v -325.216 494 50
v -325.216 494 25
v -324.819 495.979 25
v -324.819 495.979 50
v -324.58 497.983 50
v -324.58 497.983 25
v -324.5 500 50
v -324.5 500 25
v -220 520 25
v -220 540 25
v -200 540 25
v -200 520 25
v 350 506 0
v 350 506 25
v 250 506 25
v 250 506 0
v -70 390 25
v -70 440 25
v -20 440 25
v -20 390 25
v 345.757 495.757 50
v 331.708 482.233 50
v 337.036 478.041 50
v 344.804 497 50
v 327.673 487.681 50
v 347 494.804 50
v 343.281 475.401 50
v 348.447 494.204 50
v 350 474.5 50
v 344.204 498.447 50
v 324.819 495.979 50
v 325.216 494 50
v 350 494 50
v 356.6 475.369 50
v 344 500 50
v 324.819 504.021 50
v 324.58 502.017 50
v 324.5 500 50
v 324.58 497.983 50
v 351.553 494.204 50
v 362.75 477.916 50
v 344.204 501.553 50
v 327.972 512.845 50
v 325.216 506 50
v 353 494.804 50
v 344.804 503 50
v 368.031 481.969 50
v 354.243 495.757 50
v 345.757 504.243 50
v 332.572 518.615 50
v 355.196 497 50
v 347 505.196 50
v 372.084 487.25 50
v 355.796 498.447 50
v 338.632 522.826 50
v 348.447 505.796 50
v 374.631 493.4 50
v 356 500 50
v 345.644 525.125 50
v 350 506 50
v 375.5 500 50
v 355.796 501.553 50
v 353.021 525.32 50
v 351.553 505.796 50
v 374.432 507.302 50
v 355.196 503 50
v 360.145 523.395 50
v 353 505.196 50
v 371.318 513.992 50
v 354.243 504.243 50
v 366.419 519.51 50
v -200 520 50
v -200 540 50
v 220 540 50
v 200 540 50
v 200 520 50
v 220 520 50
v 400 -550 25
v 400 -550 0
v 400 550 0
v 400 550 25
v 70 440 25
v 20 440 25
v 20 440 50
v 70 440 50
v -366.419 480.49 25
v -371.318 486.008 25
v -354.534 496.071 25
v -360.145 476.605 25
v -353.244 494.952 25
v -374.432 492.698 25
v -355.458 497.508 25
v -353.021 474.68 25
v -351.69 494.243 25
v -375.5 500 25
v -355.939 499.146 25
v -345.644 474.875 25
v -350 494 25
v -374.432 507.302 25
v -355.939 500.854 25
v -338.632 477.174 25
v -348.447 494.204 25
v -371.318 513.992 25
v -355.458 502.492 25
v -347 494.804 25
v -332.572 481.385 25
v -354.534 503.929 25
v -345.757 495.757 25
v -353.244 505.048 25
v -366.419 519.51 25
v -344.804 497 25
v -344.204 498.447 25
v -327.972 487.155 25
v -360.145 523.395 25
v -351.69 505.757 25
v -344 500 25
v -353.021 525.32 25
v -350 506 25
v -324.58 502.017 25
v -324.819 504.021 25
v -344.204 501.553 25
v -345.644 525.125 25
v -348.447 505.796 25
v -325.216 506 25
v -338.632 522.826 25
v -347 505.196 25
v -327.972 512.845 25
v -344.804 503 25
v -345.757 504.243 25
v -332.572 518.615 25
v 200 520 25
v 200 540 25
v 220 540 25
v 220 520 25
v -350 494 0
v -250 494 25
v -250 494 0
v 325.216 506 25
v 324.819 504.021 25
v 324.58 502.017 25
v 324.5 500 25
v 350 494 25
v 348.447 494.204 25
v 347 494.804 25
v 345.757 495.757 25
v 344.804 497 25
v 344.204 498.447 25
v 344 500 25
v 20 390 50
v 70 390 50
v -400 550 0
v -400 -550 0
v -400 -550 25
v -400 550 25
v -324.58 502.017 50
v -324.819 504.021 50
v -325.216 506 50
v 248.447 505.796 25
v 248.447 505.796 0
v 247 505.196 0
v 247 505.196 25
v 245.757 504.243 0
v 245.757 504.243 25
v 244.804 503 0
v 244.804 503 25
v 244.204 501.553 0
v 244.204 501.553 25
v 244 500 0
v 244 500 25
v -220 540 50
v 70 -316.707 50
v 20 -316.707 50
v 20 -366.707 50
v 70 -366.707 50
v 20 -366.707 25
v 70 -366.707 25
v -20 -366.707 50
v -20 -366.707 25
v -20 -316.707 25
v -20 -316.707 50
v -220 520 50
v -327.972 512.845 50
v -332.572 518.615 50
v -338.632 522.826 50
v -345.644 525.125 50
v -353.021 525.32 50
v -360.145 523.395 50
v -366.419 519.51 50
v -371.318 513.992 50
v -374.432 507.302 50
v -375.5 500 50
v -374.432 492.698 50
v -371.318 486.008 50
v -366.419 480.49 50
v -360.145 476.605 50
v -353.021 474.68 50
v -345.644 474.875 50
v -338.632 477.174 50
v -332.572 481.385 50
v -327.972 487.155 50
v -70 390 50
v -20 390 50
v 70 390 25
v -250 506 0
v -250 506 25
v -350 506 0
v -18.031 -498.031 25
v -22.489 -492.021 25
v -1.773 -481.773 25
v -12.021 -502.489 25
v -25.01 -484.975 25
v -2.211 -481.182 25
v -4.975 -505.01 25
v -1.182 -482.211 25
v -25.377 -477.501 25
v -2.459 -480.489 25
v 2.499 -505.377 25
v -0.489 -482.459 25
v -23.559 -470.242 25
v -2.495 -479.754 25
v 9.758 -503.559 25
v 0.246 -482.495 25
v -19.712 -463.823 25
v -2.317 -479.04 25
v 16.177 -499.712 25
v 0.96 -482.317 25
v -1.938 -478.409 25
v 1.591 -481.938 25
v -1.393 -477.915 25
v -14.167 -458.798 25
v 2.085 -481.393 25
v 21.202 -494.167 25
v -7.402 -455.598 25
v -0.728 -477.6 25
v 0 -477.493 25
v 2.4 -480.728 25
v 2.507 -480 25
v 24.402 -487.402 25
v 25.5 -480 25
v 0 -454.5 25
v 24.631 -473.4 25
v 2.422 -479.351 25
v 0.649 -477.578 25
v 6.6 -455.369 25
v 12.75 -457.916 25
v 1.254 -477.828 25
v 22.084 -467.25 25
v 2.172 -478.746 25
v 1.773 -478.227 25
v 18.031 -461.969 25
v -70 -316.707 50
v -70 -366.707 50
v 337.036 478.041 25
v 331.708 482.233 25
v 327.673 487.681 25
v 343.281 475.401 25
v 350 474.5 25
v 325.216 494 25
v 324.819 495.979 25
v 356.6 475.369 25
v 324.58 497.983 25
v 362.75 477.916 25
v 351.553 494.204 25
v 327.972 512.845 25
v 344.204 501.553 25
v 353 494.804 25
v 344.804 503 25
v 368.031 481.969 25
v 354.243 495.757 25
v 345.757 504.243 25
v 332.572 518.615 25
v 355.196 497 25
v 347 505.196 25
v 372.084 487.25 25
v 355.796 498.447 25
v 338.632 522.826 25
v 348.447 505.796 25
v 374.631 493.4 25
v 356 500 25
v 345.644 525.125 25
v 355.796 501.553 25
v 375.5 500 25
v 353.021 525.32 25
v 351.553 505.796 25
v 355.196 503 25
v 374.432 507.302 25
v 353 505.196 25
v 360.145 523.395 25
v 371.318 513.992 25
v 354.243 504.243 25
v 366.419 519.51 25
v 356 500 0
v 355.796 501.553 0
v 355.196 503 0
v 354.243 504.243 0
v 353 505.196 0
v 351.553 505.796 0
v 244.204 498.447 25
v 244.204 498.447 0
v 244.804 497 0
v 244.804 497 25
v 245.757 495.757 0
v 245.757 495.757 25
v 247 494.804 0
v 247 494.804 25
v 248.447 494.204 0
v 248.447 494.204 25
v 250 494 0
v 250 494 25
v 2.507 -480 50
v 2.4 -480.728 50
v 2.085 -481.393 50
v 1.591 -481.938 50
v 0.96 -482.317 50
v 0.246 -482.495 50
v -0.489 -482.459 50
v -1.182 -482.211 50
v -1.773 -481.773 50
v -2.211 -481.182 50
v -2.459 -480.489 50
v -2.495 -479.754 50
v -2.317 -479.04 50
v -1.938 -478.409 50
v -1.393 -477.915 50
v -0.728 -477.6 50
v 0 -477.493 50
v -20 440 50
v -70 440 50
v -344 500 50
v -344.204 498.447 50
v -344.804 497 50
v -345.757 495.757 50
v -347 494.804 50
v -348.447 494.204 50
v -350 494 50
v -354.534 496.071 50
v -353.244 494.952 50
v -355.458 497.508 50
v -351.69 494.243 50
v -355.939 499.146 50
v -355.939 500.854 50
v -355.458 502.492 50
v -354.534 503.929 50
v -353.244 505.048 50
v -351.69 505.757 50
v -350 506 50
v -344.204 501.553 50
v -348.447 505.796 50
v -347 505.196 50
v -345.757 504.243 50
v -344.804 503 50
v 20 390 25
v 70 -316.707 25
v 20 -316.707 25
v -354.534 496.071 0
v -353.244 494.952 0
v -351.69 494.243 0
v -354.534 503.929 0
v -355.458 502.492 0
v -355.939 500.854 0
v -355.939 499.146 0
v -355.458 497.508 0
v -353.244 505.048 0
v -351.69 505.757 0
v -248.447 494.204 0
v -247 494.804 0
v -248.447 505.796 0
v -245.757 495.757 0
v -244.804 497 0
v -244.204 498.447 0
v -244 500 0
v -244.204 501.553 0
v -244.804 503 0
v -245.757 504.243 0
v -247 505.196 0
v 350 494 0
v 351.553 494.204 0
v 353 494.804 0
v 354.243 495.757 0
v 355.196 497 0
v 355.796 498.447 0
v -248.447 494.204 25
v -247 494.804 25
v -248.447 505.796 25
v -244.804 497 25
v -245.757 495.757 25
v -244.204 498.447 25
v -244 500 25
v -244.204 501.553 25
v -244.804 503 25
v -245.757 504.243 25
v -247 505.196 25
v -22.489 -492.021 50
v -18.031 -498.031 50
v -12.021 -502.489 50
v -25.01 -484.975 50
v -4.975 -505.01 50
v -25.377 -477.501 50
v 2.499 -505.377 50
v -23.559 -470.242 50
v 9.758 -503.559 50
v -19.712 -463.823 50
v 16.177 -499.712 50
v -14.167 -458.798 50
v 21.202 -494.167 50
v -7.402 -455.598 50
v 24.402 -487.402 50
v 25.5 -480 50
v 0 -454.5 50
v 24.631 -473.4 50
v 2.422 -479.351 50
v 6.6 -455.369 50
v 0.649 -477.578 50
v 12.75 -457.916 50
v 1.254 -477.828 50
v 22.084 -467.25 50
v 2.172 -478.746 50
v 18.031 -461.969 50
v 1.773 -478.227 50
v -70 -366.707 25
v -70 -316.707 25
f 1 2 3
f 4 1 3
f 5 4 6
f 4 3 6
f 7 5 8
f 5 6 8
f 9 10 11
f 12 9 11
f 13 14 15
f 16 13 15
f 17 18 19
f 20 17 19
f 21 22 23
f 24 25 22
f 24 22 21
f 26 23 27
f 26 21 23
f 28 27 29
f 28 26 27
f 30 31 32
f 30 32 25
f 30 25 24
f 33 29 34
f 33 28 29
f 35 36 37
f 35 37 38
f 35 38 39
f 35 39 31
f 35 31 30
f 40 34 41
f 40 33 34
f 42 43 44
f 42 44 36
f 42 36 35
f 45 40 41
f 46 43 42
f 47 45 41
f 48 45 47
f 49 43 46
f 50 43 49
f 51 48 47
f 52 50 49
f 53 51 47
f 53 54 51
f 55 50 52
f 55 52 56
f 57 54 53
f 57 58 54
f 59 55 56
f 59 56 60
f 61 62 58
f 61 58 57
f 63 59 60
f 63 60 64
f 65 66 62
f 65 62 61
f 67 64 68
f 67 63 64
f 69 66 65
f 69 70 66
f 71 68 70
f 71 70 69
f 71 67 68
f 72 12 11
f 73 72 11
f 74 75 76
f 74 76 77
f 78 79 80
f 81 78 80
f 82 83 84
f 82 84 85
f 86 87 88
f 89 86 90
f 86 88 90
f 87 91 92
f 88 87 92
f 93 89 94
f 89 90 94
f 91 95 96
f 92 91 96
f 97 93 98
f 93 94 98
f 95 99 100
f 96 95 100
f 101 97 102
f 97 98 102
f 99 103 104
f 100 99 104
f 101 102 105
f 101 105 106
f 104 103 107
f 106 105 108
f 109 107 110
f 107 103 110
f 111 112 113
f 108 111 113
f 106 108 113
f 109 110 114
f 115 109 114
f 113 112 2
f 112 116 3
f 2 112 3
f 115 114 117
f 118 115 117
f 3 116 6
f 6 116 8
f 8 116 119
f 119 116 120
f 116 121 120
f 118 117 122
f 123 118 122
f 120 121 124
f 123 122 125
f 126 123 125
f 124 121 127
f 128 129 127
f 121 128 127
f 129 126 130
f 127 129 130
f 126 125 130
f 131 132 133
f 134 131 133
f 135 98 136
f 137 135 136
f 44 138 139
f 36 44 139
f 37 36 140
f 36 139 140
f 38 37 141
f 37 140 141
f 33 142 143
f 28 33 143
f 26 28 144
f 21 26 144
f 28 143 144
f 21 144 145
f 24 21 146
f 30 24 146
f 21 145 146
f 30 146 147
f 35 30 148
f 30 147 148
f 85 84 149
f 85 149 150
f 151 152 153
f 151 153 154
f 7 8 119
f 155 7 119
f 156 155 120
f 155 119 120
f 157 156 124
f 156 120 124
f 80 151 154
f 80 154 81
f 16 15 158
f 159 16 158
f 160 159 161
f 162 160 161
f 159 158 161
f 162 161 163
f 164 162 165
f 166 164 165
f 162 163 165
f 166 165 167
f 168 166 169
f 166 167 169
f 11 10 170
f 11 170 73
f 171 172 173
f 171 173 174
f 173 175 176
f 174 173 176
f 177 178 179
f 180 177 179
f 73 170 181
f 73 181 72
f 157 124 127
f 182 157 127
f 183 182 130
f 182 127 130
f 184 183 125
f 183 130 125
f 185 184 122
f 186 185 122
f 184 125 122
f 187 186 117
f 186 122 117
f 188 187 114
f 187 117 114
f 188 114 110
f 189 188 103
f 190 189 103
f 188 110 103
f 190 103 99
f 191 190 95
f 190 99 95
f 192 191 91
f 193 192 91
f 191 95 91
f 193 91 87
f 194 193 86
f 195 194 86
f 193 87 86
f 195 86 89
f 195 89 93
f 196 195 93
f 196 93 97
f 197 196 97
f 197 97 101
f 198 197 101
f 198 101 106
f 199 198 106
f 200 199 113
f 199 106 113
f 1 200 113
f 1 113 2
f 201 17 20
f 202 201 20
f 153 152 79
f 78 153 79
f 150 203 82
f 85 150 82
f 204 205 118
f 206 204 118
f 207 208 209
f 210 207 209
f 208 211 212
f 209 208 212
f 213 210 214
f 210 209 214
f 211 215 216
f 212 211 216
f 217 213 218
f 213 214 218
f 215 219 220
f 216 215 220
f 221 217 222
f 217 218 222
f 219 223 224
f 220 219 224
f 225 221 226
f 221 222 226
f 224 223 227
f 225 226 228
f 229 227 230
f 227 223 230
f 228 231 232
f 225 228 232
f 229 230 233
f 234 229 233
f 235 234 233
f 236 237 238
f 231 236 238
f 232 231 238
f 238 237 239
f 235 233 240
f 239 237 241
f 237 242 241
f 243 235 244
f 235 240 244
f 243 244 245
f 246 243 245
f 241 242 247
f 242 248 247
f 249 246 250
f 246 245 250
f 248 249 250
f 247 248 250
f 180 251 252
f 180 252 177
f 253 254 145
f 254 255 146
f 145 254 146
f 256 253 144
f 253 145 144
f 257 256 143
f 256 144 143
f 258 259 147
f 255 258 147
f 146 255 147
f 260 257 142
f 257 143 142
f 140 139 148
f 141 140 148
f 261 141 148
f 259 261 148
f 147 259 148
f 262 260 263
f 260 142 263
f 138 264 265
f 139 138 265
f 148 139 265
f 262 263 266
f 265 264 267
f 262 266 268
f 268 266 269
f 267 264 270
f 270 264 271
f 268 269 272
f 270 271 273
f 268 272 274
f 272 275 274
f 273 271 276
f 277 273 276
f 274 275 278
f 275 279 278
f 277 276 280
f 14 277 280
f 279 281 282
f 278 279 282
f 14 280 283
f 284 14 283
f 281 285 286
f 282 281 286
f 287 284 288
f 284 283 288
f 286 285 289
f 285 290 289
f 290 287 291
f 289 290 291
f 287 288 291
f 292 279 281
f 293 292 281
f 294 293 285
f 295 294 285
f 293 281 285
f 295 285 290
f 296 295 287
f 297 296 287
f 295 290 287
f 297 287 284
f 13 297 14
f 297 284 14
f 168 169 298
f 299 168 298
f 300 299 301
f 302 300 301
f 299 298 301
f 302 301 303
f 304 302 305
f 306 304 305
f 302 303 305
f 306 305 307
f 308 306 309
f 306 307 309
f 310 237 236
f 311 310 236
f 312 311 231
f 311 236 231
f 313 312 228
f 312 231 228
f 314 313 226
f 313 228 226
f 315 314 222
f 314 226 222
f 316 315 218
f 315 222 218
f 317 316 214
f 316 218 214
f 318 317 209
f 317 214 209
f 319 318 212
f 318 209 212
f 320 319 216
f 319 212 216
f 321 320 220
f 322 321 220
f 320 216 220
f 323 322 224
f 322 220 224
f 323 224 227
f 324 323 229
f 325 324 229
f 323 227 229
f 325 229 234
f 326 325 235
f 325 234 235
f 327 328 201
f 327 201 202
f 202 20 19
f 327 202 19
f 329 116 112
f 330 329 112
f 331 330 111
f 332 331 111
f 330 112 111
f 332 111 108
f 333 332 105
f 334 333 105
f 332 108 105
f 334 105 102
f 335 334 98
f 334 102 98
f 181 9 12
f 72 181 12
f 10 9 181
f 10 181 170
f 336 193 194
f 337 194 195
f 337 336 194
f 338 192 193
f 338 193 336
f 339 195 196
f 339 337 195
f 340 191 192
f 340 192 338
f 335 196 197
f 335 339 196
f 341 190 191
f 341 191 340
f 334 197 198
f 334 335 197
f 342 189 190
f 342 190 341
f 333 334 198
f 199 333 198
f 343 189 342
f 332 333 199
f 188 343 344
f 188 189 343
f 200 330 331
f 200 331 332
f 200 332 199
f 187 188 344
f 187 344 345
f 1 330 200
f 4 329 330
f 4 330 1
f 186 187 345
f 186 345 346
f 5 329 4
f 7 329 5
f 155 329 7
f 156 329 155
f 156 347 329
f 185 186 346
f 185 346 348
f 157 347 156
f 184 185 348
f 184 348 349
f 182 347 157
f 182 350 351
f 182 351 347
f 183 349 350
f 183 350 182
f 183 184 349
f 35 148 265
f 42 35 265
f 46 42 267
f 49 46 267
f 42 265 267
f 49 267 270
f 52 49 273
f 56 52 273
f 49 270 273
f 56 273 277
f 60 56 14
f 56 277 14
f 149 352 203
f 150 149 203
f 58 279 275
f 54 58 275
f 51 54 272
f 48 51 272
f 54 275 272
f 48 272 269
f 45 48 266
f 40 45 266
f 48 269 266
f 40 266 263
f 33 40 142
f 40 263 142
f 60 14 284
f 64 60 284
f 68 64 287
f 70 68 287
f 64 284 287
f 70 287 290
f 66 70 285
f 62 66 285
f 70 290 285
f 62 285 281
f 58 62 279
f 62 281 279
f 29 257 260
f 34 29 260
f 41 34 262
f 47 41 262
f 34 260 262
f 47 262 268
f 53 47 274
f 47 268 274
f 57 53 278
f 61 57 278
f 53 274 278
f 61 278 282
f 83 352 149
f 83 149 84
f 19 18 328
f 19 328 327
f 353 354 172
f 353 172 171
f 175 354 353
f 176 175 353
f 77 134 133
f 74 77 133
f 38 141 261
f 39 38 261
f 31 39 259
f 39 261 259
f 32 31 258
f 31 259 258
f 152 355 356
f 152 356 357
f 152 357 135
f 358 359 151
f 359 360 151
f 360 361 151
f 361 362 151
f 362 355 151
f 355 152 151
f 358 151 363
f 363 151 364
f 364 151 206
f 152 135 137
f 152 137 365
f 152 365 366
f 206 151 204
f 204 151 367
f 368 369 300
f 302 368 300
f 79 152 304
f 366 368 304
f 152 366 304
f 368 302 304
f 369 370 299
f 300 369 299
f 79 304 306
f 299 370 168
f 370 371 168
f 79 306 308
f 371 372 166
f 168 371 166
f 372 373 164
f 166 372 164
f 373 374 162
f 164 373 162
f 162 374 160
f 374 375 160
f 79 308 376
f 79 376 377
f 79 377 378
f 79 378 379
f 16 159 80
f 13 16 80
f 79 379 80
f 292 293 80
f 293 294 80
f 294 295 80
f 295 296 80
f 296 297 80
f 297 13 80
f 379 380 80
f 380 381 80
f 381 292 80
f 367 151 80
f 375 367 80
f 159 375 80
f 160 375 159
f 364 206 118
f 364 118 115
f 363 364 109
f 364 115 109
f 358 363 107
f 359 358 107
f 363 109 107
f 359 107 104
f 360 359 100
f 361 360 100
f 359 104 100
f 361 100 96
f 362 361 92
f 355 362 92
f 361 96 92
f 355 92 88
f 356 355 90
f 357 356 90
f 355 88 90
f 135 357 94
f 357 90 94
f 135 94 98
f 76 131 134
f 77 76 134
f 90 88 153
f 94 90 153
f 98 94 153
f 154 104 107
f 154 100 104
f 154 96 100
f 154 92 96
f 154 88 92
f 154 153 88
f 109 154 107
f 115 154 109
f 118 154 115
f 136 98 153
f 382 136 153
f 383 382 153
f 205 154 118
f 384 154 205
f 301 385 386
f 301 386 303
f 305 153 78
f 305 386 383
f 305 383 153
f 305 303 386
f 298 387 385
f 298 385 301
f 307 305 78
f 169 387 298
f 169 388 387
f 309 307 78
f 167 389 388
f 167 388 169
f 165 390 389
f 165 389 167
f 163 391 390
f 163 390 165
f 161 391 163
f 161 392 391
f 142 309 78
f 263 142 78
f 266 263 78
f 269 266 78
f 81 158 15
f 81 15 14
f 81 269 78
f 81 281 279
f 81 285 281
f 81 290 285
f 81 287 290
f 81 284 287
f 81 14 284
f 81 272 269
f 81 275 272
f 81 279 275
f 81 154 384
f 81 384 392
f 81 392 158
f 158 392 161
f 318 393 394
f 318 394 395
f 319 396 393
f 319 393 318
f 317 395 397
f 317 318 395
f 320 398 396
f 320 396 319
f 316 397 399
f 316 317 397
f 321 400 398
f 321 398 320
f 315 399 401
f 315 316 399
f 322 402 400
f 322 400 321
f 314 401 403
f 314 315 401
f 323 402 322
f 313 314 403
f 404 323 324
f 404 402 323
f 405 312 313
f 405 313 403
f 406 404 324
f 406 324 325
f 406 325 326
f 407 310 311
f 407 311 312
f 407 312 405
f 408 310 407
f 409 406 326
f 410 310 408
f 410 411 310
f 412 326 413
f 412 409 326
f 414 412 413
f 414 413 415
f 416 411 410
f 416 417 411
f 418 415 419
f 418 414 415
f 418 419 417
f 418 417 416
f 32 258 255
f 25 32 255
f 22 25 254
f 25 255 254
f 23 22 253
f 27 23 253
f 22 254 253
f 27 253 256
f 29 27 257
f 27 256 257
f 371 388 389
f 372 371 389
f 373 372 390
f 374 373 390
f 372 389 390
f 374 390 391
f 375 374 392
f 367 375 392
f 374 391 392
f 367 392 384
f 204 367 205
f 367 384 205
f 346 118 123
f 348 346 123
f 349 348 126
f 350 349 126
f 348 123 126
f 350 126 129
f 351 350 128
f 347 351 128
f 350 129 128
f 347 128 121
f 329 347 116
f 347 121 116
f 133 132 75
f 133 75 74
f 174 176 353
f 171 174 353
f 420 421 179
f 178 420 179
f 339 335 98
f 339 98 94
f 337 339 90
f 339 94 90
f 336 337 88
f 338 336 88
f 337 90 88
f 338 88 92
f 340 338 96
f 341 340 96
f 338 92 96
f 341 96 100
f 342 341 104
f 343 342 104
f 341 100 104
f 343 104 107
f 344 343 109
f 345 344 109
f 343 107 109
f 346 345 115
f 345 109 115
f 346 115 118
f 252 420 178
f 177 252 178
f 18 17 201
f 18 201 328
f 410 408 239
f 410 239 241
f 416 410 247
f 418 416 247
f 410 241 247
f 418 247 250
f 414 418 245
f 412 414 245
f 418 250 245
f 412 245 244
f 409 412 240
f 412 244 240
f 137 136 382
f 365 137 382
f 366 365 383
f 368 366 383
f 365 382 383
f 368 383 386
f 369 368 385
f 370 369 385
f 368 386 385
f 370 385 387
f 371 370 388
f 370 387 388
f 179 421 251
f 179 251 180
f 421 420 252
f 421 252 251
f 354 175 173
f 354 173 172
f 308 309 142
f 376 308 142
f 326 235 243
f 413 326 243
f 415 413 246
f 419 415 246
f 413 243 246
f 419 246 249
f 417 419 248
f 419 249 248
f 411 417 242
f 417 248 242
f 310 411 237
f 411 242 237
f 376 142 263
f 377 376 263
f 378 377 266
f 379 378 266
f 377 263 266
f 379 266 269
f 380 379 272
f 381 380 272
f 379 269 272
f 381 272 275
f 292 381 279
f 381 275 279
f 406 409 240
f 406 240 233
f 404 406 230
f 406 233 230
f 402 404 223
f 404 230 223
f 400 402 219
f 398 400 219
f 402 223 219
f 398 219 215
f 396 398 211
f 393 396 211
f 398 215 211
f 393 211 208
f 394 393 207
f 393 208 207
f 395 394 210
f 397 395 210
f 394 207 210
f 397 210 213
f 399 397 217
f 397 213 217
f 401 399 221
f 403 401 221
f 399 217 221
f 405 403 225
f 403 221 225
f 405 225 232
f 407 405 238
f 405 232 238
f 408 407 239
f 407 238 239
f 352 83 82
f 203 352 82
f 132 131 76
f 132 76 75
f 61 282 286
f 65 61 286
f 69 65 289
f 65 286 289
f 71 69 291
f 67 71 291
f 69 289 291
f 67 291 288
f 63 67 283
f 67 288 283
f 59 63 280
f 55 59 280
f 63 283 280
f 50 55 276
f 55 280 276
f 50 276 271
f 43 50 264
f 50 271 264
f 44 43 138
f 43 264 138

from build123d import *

# Parameters (mm, degrees)
F0_W     = 800
F0_H     = 1100
F1_DEPTH = 25
F3_DEPTH = 25
F4_DEPTH = 25
F2_W     = 50
F2_H     = 50
F2_W_2   = 20
F2_H_2   = 20


with BuildPart() as f1:
    # F0 (on Top) → F1 (new body)
    with BuildSketch(Plane.XY):
        Rectangle(F0_W, F0_H)
    extrude(amount=F1_DEPTH)

    # F2 (on face) → F3 (cut)
    with BuildSketch(Plane.XY.offset(25)):
        with BuildLine():
            Line((-256, 500), (-244, 500))
            ThreePointArc((-244, 500), (-245.7573593129, 504.2426406871), (-250, 506))
            ThreePointArc((-250, 506), (-254.2426406871, 504.2426406871), (-256, 500))
        make_face()
        with BuildLine():
            ThreePointArc((-250, 494), (-245.7573593129, 495.7573593129), (-244, 500))
            Line((-244, 500), (-256, 500))
            ThreePointArc((-256, 500), (-254.2426406871, 495.7573593129), (-250, 494))
        make_face()
        with BuildLine():
            ThreePointArc((-250, 494), (-254.2426406871, 495.7573593129), (-256, 500))
            Line((-256, 500), (-324.5, 500))
            ThreePointArc((-324.5, 500), (-324.6796157187, 496.9787188397), (-325.2159325372, 494))
            Line((-325.2159325372, 494), (-250, 494))
        make_face()
        with BuildLine():
            Line((-324.5, 500), (-256, 500))
            ThreePointArc((-256, 500), (-254.2426406871, 504.2426406871), (-250, 506))
            Line((-250, 506), (-325.2159325372, 506))
            ThreePointArc((-325.2159325372, 506), (-324.6796157187, 503.0212811603), (-324.5, 500))
        make_face()
        with BuildLine():
            ThreePointArc((-350, 494), (-345.7573593129, 495.7573593129), (-344, 500))
            ThreePointArc((-344, 500), (-345.7573593129, 504.2426406871), (-350, 506))
            ThreePointArc((-350, 506), (-356, 500), (-350, 494))
        make_face()
        with BuildLine():
            ThreePointArc((-325.2159325372, 494), (-324.6796157187, 496.9787188397), (-324.5, 500))
            Line((-324.5, 500), (-344, 500))
            ThreePointArc((-344, 500), (-345.7573593129, 495.7573593129), (-350, 494))
            Line((-350, 494), (-325.2159325372, 494))
        make_face()
        with BuildLine():
            Line((-344, 500), (-324.5, 500))
            ThreePointArc((-324.5, 500), (-324.6796157187, 503.0212811603), (-325.2159325372, 506))
            Line((-325.2159325372, 506), (-350, 506))
            ThreePointArc((-350, 506), (-345.7573593129, 504.2426406871), (-344, 500))
        make_face()
        with BuildLine():
            ThreePointArc((250, 506), (254.2426406871, 504.2426406871), (256, 500))
            Line((256, 500), (324.5, 500))
            ThreePointArc((324.5, 500), (324.6796157187, 503.0212811603), (325.2159325372, 506))
            Line((325.2159325372, 506), (250, 506))
        make_face()
        with BuildLine():
            Line((324.5, 500), (256, 500))
            ThreePointArc((256, 500), (254.2426406871, 495.7573593129), (250, 494))
            Line((250, 494), (325.2159325372, 494))
            ThreePointArc((325.2159325372, 494), (324.6796157187, 496.9787188397), (324.5, 500))
        make_face()
        with BuildLine():
            ThreePointArc((325.2159325372, 506), (324.6796157187, 503.0212811603), (324.5, 500))
            Line((324.5, 500), (344, 500))
            ThreePointArc((344, 500), (345.7573593129, 504.2426406871), (350, 506))
            Line((350, 506), (325.2159325372, 506))
        make_face()
        with BuildLine():
            Line((344, 500), (324.5, 500))
            ThreePointArc((324.5, 500), (324.6796157187, 496.9787188397), (325.2159325372, 494))
            Line((325.2159325372, 494), (350, 494))
            ThreePointArc((350, 494), (345.7573593129, 495.7573593129), (344, 500))
        make_face()
        with BuildLine():
            ThreePointArc((350, 506), (345.7573593129, 504.2426406871), (344, 500))
            Line((344, 500), (350, 500))
            Line((350, 500), (350, 494))
            ThreePointArc((350, 494), (354.2426406871, 495.7573593129), (356, 500))
            ThreePointArc((356, 500), (354.2426406871, 504.2426406871), (350, 506))
        make_face()
        with BuildLine():
            Line((350, 500), (344, 500))
            ThreePointArc((344, 500), (345.7573593129, 495.7573593129), (350, 494))
            Line((350, 494), (350, 500))
        make_face()
        with BuildLine():
            ThreePointArc((250, 506), (245.7573593129, 504.2426406871), (244, 500))
            Line((244, 500), (256, 500))
            ThreePointArc((256, 500), (254.2426406871, 504.2426406871), (250, 506))
        make_face()
        with BuildLine():
            Line((256, 500), (244, 500))
            ThreePointArc((244, 500), (245.7573593129, 495.7573593129), (250, 494))
            ThreePointArc((250, 494), (254.2426406871, 495.7573593129), (256, 500))
        make_face()
    extrude(amount=-F3_DEPTH, mode=Mode.SUBTRACT)


with BuildPart() as f4:
    # F2 (on face) → F4 (new body)
    with BuildSketch(Plane.XY.offset(25)):
        with BuildLine():
            ThreePointArc((25.5, -480), (18.0312229203, -461.9687770797), (0, -454.5))
            ThreePointArc((0, -454.5), (-18.0312229203, -498.0312229203), (25.5, -480))
        make_face()
        with BuildLine():
            ThreePointArc((2.5074724197, -480), (-1.7730507516, -481.7730507516), (0, -477.4925275803))
            ThreePointArc((0, -477.4925275803), (1.7730507516, -478.2269492484), (2.5074724197, -480))
        make_face(mode=Mode.SUBTRACT)
    extrude(amount=F4_DEPTH)


with BuildPart() as f4b:
    # F2 (on face) → F4, piece 2 (new body)
    with BuildSketch(Plane.XY.offset(25)):
        with Locations((45, -341.7074251175)):
            Rectangle(F2_W, F2_H)
    extrude(amount=F4_DEPTH)


with BuildPart() as f4c:
    # F2 (on face) → F4, piece 3 (new body)
    with BuildSketch(Plane.XY.offset(25)):
        with Locations((-45, -341.7074251175)):
            Rectangle(F2_W, F2_H)
    extrude(amount=F4_DEPTH)


with BuildPart() as f4d:
    # F2 (on face) → F4, piece 4 (new body)
    with BuildSketch(Plane.XY.offset(25)):
        with Locations((-45, 415)):
            Rectangle(F2_W, F2_H)
    extrude(amount=F4_DEPTH)


with BuildPart() as f4e:
    # F2 (on face) → F4, piece 5 (new body)
    with BuildSketch(Plane.XY.offset(25)):
        with Locations((45, 415)):
            Rectangle(F2_W, F2_H)
    extrude(amount=F4_DEPTH)


with BuildPart() as f4f:
    # F2 (on face) → F4, piece 6 (new body)
    with BuildSketch(Plane.XY.offset(25)):
        with Locations((210, 530)):
            Rectangle(F2_W_2, F2_H_2)
    extrude(amount=F4_DEPTH)


with BuildPart() as f4g:
    # F2 (on face) → F4, piece 7 (new body)
    with BuildSketch(Plane.XY.offset(25)):
        with Locations((-210, 530)):
            Rectangle(F2_W_2, F2_H_2)
    extrude(amount=F4_DEPTH)


with BuildPart() as f4h:
    # F2 (on face) → F4, piece 8 (new body)
    with BuildSketch(Plane.XY.offset(25)):
        with BuildLine():
            Line((-350, 506), (-325.2159325372, 506))
            ThreePointArc((-325.2159325372, 506), (-375.5, 500), (-325.2159325372, 494))
            Line((-325.2159325372, 494), (-350, 494))
            ThreePointArc((-350, 494), (-356, 500), (-350, 506))
        make_face()
        with BuildLine():
            Line((-344, 500), (-324.5, 500))
            ThreePointArc((-324.5, 500), (-324.6796157187, 503.0212811603), (-325.2159325372, 506))
            Line((-325.2159325372, 506), (-350, 506))
            ThreePointArc((-350, 506), (-345.7573593129, 504.2426406871), (-344, 500))
        make_face()
        with BuildLine():
            ThreePointArc((-325.2159325372, 494), (-324.6796157187, 496.9787188397), (-324.5, 500))
            Line((-324.5, 500), (-344, 500))
            ThreePointArc((-344, 500), (-345.7573593129, 495.7573593129), (-350, 494))
            Line((-350, 494), (-325.2159325372, 494))
        make_face()
    extrude(amount=F4_DEPTH)


with BuildPart() as f4i:
    # F2 (on face) → F4, piece 9 (new body)
    with BuildSketch(Plane.XY.offset(25)):
        with BuildLine():
            ThreePointArc((375.5, 500), (353.0212811603, 525.3203842813), (325.2159325372, 506))
            Line((325.2159325372, 506), (350, 506))
            ThreePointArc((350, 506), (354.2426406871, 504.2426406871), (356, 500))
            ThreePointArc((356, 500), (354.2426406871, 495.7573593129), (350, 494))
            Line((350, 494), (350, 474.5))
            ThreePointArc((350, 474.5), (368.0312229203, 481.9687770797), (375.5, 500))
        make_face()
        with BuildLine():
            Line((350, 494), (325.2159325372, 494))
            ThreePointArc((325.2159325372, 494), (334.2321529688, 479.9594161762), (350, 474.5))
            Line((350, 474.5), (350, 494))
        make_face()
        with BuildLine():
            ThreePointArc((325.2159325372, 506), (324.6796157187, 503.0212811603), (324.5, 500))
            Line((324.5, 500), (344, 500))
            ThreePointArc((344, 500), (345.7573593129, 504.2426406871), (350, 506))
            Line((350, 506), (325.2159325372, 506))
        make_face()
        with BuildLine():
            Line((344, 500), (324.5, 500))
            ThreePointArc((324.5, 500), (324.6796157187, 496.9787188397), (325.2159325372, 494))
            Line((325.2159325372, 494), (350, 494))
            ThreePointArc((350, 494), (345.7573593129, 495.7573593129), (344, 500))
        make_face()
    extrude(amount=F4_DEPTH)


solid = Compound([f1.part, f4.part, f4b.part, f4c.part, f4d.part, f4e.part, f4f.part, f4g.part, f4h.part, f4i.part])
